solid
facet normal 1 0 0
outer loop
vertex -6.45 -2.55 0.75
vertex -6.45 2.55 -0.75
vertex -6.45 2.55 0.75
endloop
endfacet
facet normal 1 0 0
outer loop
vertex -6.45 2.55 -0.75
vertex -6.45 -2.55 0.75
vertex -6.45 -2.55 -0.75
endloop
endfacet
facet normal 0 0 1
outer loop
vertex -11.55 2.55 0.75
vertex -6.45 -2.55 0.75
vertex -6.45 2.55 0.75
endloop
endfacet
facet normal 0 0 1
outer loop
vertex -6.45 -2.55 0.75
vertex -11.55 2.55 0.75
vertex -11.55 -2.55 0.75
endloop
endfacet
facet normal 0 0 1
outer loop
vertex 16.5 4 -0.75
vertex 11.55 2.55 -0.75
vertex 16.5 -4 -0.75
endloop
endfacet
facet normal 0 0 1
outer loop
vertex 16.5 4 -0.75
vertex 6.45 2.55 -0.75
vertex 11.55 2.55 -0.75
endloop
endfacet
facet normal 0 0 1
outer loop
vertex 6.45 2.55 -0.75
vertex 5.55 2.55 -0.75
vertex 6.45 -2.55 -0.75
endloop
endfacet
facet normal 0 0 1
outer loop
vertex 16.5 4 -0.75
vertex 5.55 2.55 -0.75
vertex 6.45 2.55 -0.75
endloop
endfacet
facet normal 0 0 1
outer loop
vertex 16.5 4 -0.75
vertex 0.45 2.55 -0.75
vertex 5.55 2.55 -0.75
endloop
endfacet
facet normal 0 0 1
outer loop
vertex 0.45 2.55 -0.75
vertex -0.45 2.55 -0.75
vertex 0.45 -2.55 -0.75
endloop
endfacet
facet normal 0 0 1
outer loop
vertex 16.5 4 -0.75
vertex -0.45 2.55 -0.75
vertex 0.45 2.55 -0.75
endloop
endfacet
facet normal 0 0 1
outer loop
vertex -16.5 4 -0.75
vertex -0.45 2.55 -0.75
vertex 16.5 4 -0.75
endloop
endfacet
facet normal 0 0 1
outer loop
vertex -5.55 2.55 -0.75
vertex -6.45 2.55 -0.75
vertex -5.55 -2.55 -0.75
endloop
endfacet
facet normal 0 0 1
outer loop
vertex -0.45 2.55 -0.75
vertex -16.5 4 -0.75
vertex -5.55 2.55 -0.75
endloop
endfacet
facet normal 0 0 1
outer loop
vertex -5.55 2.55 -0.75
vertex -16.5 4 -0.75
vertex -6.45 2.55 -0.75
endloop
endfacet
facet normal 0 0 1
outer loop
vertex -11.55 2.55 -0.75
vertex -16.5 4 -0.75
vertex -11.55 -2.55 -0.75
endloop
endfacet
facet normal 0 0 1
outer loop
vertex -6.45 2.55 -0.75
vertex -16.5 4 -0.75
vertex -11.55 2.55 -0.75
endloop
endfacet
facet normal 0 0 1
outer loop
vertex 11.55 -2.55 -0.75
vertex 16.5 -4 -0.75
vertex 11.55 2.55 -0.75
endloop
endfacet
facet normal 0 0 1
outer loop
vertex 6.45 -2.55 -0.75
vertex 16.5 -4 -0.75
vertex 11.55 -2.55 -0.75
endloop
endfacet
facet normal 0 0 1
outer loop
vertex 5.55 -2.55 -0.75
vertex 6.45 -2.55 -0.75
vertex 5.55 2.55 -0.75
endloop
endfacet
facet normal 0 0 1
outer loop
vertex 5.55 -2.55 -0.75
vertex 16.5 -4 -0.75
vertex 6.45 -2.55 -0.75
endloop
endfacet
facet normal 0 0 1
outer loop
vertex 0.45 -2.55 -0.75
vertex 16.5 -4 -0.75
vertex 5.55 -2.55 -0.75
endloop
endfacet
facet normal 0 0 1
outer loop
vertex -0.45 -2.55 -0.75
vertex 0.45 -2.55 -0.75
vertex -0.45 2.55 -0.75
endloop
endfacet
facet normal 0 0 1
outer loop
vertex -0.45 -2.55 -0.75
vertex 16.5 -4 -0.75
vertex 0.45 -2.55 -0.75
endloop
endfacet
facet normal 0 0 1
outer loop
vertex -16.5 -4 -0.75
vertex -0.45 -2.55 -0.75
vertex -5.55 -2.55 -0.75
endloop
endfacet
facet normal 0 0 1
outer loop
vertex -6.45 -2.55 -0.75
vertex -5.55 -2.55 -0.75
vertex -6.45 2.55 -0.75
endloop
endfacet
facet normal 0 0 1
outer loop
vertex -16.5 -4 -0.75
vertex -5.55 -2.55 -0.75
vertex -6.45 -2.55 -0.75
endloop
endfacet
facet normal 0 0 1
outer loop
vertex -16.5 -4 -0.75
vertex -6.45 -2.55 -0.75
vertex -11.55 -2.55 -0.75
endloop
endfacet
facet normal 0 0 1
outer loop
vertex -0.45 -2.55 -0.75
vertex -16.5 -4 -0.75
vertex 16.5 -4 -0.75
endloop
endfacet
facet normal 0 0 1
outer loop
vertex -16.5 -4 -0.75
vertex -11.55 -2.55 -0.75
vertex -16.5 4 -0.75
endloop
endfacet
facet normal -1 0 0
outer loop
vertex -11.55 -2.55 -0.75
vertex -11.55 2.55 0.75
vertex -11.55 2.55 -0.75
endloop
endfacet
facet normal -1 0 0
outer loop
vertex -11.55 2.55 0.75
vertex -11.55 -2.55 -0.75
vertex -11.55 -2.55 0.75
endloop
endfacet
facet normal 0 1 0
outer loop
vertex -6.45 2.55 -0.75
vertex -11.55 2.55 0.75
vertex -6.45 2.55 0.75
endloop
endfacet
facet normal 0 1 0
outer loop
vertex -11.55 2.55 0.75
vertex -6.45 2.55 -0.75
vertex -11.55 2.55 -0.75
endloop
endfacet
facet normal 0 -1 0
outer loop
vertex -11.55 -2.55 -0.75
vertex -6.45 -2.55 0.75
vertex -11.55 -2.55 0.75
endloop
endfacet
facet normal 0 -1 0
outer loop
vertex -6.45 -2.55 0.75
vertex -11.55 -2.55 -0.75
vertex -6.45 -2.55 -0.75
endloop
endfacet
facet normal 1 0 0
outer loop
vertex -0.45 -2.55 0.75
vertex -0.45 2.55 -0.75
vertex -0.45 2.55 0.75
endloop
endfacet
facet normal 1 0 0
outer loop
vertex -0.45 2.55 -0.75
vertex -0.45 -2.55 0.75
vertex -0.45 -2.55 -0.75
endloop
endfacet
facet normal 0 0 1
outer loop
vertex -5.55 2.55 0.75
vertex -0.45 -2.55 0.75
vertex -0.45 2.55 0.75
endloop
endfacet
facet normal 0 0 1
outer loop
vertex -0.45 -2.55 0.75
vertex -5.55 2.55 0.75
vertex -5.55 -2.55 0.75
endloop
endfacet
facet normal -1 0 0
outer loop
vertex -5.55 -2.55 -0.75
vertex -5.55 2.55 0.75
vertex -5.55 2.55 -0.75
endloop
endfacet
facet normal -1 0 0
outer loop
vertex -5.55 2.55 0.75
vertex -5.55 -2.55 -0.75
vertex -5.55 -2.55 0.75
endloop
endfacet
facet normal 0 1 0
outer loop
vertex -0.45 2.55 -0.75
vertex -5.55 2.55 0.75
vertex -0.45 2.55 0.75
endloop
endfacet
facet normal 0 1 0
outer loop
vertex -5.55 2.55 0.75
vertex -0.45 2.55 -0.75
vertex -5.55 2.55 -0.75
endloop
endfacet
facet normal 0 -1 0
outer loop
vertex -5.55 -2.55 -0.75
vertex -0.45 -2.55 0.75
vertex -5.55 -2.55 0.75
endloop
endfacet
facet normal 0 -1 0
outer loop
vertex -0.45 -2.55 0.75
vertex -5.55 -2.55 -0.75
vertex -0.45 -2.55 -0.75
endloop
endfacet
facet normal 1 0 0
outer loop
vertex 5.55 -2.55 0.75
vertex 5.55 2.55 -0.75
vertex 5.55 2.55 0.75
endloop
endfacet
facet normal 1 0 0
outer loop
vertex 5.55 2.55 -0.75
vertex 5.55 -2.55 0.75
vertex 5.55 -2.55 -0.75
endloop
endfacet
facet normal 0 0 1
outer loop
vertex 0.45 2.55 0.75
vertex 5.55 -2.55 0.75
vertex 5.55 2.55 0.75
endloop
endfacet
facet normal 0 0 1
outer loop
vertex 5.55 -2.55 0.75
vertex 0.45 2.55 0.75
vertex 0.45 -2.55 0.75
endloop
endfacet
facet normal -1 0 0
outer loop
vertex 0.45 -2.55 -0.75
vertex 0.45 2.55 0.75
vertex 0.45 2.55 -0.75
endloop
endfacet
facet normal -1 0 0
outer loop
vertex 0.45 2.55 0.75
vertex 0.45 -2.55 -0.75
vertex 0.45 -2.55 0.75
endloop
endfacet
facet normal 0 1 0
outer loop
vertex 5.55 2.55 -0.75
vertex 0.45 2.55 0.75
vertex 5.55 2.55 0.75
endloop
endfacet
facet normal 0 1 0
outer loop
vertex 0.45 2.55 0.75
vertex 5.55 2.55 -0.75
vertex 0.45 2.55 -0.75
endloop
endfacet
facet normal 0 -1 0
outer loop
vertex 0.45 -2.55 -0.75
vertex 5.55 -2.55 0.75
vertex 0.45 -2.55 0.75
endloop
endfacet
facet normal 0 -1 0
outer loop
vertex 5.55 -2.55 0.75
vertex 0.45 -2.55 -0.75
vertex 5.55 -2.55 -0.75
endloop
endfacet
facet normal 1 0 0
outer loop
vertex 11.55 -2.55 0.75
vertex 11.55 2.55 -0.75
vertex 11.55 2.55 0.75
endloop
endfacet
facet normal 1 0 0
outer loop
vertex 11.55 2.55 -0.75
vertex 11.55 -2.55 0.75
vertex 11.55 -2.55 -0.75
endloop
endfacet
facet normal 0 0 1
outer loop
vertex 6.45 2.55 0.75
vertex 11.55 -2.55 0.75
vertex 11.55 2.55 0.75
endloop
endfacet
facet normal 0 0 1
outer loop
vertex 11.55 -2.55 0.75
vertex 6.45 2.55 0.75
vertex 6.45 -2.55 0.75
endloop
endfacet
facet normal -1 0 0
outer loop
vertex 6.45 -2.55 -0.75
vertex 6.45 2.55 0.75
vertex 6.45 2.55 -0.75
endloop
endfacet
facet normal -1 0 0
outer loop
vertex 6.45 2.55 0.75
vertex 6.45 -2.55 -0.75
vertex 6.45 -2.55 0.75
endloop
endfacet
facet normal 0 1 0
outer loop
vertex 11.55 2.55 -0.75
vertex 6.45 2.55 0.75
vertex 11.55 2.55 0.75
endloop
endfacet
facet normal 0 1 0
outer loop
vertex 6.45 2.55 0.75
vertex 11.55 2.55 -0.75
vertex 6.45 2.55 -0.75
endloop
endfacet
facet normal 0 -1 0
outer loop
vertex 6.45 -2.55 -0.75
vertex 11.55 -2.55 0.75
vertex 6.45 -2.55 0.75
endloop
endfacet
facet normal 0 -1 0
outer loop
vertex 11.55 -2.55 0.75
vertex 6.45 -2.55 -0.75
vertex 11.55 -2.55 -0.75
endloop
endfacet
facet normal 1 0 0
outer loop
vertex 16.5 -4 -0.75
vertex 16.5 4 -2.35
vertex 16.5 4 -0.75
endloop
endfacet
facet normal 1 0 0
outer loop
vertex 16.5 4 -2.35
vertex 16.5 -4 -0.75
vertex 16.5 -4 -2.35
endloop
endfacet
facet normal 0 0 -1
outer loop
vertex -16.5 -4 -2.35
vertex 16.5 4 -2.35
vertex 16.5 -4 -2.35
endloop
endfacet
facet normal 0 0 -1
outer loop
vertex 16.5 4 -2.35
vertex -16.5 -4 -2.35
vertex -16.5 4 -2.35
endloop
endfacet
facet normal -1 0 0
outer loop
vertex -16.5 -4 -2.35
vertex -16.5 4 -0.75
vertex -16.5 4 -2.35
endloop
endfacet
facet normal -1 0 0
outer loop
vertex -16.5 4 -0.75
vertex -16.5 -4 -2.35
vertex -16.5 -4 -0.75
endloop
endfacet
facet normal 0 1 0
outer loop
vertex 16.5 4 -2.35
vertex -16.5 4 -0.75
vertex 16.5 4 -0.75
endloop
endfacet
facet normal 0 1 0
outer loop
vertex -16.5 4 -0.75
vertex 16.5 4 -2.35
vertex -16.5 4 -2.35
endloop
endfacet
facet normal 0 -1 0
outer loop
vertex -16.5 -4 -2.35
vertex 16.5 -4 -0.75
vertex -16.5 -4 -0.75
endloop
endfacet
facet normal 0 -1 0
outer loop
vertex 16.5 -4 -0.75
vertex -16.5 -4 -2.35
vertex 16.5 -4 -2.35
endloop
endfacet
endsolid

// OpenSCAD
for(i=[-9:6:9])translate([i,0,0])led();
color("green")translate([0,0,-1.5/2-1.6/2])cube([33,8,1.6],true);


module led(){
    color("white")cube([5.1,5.1,1.5],true);
}
